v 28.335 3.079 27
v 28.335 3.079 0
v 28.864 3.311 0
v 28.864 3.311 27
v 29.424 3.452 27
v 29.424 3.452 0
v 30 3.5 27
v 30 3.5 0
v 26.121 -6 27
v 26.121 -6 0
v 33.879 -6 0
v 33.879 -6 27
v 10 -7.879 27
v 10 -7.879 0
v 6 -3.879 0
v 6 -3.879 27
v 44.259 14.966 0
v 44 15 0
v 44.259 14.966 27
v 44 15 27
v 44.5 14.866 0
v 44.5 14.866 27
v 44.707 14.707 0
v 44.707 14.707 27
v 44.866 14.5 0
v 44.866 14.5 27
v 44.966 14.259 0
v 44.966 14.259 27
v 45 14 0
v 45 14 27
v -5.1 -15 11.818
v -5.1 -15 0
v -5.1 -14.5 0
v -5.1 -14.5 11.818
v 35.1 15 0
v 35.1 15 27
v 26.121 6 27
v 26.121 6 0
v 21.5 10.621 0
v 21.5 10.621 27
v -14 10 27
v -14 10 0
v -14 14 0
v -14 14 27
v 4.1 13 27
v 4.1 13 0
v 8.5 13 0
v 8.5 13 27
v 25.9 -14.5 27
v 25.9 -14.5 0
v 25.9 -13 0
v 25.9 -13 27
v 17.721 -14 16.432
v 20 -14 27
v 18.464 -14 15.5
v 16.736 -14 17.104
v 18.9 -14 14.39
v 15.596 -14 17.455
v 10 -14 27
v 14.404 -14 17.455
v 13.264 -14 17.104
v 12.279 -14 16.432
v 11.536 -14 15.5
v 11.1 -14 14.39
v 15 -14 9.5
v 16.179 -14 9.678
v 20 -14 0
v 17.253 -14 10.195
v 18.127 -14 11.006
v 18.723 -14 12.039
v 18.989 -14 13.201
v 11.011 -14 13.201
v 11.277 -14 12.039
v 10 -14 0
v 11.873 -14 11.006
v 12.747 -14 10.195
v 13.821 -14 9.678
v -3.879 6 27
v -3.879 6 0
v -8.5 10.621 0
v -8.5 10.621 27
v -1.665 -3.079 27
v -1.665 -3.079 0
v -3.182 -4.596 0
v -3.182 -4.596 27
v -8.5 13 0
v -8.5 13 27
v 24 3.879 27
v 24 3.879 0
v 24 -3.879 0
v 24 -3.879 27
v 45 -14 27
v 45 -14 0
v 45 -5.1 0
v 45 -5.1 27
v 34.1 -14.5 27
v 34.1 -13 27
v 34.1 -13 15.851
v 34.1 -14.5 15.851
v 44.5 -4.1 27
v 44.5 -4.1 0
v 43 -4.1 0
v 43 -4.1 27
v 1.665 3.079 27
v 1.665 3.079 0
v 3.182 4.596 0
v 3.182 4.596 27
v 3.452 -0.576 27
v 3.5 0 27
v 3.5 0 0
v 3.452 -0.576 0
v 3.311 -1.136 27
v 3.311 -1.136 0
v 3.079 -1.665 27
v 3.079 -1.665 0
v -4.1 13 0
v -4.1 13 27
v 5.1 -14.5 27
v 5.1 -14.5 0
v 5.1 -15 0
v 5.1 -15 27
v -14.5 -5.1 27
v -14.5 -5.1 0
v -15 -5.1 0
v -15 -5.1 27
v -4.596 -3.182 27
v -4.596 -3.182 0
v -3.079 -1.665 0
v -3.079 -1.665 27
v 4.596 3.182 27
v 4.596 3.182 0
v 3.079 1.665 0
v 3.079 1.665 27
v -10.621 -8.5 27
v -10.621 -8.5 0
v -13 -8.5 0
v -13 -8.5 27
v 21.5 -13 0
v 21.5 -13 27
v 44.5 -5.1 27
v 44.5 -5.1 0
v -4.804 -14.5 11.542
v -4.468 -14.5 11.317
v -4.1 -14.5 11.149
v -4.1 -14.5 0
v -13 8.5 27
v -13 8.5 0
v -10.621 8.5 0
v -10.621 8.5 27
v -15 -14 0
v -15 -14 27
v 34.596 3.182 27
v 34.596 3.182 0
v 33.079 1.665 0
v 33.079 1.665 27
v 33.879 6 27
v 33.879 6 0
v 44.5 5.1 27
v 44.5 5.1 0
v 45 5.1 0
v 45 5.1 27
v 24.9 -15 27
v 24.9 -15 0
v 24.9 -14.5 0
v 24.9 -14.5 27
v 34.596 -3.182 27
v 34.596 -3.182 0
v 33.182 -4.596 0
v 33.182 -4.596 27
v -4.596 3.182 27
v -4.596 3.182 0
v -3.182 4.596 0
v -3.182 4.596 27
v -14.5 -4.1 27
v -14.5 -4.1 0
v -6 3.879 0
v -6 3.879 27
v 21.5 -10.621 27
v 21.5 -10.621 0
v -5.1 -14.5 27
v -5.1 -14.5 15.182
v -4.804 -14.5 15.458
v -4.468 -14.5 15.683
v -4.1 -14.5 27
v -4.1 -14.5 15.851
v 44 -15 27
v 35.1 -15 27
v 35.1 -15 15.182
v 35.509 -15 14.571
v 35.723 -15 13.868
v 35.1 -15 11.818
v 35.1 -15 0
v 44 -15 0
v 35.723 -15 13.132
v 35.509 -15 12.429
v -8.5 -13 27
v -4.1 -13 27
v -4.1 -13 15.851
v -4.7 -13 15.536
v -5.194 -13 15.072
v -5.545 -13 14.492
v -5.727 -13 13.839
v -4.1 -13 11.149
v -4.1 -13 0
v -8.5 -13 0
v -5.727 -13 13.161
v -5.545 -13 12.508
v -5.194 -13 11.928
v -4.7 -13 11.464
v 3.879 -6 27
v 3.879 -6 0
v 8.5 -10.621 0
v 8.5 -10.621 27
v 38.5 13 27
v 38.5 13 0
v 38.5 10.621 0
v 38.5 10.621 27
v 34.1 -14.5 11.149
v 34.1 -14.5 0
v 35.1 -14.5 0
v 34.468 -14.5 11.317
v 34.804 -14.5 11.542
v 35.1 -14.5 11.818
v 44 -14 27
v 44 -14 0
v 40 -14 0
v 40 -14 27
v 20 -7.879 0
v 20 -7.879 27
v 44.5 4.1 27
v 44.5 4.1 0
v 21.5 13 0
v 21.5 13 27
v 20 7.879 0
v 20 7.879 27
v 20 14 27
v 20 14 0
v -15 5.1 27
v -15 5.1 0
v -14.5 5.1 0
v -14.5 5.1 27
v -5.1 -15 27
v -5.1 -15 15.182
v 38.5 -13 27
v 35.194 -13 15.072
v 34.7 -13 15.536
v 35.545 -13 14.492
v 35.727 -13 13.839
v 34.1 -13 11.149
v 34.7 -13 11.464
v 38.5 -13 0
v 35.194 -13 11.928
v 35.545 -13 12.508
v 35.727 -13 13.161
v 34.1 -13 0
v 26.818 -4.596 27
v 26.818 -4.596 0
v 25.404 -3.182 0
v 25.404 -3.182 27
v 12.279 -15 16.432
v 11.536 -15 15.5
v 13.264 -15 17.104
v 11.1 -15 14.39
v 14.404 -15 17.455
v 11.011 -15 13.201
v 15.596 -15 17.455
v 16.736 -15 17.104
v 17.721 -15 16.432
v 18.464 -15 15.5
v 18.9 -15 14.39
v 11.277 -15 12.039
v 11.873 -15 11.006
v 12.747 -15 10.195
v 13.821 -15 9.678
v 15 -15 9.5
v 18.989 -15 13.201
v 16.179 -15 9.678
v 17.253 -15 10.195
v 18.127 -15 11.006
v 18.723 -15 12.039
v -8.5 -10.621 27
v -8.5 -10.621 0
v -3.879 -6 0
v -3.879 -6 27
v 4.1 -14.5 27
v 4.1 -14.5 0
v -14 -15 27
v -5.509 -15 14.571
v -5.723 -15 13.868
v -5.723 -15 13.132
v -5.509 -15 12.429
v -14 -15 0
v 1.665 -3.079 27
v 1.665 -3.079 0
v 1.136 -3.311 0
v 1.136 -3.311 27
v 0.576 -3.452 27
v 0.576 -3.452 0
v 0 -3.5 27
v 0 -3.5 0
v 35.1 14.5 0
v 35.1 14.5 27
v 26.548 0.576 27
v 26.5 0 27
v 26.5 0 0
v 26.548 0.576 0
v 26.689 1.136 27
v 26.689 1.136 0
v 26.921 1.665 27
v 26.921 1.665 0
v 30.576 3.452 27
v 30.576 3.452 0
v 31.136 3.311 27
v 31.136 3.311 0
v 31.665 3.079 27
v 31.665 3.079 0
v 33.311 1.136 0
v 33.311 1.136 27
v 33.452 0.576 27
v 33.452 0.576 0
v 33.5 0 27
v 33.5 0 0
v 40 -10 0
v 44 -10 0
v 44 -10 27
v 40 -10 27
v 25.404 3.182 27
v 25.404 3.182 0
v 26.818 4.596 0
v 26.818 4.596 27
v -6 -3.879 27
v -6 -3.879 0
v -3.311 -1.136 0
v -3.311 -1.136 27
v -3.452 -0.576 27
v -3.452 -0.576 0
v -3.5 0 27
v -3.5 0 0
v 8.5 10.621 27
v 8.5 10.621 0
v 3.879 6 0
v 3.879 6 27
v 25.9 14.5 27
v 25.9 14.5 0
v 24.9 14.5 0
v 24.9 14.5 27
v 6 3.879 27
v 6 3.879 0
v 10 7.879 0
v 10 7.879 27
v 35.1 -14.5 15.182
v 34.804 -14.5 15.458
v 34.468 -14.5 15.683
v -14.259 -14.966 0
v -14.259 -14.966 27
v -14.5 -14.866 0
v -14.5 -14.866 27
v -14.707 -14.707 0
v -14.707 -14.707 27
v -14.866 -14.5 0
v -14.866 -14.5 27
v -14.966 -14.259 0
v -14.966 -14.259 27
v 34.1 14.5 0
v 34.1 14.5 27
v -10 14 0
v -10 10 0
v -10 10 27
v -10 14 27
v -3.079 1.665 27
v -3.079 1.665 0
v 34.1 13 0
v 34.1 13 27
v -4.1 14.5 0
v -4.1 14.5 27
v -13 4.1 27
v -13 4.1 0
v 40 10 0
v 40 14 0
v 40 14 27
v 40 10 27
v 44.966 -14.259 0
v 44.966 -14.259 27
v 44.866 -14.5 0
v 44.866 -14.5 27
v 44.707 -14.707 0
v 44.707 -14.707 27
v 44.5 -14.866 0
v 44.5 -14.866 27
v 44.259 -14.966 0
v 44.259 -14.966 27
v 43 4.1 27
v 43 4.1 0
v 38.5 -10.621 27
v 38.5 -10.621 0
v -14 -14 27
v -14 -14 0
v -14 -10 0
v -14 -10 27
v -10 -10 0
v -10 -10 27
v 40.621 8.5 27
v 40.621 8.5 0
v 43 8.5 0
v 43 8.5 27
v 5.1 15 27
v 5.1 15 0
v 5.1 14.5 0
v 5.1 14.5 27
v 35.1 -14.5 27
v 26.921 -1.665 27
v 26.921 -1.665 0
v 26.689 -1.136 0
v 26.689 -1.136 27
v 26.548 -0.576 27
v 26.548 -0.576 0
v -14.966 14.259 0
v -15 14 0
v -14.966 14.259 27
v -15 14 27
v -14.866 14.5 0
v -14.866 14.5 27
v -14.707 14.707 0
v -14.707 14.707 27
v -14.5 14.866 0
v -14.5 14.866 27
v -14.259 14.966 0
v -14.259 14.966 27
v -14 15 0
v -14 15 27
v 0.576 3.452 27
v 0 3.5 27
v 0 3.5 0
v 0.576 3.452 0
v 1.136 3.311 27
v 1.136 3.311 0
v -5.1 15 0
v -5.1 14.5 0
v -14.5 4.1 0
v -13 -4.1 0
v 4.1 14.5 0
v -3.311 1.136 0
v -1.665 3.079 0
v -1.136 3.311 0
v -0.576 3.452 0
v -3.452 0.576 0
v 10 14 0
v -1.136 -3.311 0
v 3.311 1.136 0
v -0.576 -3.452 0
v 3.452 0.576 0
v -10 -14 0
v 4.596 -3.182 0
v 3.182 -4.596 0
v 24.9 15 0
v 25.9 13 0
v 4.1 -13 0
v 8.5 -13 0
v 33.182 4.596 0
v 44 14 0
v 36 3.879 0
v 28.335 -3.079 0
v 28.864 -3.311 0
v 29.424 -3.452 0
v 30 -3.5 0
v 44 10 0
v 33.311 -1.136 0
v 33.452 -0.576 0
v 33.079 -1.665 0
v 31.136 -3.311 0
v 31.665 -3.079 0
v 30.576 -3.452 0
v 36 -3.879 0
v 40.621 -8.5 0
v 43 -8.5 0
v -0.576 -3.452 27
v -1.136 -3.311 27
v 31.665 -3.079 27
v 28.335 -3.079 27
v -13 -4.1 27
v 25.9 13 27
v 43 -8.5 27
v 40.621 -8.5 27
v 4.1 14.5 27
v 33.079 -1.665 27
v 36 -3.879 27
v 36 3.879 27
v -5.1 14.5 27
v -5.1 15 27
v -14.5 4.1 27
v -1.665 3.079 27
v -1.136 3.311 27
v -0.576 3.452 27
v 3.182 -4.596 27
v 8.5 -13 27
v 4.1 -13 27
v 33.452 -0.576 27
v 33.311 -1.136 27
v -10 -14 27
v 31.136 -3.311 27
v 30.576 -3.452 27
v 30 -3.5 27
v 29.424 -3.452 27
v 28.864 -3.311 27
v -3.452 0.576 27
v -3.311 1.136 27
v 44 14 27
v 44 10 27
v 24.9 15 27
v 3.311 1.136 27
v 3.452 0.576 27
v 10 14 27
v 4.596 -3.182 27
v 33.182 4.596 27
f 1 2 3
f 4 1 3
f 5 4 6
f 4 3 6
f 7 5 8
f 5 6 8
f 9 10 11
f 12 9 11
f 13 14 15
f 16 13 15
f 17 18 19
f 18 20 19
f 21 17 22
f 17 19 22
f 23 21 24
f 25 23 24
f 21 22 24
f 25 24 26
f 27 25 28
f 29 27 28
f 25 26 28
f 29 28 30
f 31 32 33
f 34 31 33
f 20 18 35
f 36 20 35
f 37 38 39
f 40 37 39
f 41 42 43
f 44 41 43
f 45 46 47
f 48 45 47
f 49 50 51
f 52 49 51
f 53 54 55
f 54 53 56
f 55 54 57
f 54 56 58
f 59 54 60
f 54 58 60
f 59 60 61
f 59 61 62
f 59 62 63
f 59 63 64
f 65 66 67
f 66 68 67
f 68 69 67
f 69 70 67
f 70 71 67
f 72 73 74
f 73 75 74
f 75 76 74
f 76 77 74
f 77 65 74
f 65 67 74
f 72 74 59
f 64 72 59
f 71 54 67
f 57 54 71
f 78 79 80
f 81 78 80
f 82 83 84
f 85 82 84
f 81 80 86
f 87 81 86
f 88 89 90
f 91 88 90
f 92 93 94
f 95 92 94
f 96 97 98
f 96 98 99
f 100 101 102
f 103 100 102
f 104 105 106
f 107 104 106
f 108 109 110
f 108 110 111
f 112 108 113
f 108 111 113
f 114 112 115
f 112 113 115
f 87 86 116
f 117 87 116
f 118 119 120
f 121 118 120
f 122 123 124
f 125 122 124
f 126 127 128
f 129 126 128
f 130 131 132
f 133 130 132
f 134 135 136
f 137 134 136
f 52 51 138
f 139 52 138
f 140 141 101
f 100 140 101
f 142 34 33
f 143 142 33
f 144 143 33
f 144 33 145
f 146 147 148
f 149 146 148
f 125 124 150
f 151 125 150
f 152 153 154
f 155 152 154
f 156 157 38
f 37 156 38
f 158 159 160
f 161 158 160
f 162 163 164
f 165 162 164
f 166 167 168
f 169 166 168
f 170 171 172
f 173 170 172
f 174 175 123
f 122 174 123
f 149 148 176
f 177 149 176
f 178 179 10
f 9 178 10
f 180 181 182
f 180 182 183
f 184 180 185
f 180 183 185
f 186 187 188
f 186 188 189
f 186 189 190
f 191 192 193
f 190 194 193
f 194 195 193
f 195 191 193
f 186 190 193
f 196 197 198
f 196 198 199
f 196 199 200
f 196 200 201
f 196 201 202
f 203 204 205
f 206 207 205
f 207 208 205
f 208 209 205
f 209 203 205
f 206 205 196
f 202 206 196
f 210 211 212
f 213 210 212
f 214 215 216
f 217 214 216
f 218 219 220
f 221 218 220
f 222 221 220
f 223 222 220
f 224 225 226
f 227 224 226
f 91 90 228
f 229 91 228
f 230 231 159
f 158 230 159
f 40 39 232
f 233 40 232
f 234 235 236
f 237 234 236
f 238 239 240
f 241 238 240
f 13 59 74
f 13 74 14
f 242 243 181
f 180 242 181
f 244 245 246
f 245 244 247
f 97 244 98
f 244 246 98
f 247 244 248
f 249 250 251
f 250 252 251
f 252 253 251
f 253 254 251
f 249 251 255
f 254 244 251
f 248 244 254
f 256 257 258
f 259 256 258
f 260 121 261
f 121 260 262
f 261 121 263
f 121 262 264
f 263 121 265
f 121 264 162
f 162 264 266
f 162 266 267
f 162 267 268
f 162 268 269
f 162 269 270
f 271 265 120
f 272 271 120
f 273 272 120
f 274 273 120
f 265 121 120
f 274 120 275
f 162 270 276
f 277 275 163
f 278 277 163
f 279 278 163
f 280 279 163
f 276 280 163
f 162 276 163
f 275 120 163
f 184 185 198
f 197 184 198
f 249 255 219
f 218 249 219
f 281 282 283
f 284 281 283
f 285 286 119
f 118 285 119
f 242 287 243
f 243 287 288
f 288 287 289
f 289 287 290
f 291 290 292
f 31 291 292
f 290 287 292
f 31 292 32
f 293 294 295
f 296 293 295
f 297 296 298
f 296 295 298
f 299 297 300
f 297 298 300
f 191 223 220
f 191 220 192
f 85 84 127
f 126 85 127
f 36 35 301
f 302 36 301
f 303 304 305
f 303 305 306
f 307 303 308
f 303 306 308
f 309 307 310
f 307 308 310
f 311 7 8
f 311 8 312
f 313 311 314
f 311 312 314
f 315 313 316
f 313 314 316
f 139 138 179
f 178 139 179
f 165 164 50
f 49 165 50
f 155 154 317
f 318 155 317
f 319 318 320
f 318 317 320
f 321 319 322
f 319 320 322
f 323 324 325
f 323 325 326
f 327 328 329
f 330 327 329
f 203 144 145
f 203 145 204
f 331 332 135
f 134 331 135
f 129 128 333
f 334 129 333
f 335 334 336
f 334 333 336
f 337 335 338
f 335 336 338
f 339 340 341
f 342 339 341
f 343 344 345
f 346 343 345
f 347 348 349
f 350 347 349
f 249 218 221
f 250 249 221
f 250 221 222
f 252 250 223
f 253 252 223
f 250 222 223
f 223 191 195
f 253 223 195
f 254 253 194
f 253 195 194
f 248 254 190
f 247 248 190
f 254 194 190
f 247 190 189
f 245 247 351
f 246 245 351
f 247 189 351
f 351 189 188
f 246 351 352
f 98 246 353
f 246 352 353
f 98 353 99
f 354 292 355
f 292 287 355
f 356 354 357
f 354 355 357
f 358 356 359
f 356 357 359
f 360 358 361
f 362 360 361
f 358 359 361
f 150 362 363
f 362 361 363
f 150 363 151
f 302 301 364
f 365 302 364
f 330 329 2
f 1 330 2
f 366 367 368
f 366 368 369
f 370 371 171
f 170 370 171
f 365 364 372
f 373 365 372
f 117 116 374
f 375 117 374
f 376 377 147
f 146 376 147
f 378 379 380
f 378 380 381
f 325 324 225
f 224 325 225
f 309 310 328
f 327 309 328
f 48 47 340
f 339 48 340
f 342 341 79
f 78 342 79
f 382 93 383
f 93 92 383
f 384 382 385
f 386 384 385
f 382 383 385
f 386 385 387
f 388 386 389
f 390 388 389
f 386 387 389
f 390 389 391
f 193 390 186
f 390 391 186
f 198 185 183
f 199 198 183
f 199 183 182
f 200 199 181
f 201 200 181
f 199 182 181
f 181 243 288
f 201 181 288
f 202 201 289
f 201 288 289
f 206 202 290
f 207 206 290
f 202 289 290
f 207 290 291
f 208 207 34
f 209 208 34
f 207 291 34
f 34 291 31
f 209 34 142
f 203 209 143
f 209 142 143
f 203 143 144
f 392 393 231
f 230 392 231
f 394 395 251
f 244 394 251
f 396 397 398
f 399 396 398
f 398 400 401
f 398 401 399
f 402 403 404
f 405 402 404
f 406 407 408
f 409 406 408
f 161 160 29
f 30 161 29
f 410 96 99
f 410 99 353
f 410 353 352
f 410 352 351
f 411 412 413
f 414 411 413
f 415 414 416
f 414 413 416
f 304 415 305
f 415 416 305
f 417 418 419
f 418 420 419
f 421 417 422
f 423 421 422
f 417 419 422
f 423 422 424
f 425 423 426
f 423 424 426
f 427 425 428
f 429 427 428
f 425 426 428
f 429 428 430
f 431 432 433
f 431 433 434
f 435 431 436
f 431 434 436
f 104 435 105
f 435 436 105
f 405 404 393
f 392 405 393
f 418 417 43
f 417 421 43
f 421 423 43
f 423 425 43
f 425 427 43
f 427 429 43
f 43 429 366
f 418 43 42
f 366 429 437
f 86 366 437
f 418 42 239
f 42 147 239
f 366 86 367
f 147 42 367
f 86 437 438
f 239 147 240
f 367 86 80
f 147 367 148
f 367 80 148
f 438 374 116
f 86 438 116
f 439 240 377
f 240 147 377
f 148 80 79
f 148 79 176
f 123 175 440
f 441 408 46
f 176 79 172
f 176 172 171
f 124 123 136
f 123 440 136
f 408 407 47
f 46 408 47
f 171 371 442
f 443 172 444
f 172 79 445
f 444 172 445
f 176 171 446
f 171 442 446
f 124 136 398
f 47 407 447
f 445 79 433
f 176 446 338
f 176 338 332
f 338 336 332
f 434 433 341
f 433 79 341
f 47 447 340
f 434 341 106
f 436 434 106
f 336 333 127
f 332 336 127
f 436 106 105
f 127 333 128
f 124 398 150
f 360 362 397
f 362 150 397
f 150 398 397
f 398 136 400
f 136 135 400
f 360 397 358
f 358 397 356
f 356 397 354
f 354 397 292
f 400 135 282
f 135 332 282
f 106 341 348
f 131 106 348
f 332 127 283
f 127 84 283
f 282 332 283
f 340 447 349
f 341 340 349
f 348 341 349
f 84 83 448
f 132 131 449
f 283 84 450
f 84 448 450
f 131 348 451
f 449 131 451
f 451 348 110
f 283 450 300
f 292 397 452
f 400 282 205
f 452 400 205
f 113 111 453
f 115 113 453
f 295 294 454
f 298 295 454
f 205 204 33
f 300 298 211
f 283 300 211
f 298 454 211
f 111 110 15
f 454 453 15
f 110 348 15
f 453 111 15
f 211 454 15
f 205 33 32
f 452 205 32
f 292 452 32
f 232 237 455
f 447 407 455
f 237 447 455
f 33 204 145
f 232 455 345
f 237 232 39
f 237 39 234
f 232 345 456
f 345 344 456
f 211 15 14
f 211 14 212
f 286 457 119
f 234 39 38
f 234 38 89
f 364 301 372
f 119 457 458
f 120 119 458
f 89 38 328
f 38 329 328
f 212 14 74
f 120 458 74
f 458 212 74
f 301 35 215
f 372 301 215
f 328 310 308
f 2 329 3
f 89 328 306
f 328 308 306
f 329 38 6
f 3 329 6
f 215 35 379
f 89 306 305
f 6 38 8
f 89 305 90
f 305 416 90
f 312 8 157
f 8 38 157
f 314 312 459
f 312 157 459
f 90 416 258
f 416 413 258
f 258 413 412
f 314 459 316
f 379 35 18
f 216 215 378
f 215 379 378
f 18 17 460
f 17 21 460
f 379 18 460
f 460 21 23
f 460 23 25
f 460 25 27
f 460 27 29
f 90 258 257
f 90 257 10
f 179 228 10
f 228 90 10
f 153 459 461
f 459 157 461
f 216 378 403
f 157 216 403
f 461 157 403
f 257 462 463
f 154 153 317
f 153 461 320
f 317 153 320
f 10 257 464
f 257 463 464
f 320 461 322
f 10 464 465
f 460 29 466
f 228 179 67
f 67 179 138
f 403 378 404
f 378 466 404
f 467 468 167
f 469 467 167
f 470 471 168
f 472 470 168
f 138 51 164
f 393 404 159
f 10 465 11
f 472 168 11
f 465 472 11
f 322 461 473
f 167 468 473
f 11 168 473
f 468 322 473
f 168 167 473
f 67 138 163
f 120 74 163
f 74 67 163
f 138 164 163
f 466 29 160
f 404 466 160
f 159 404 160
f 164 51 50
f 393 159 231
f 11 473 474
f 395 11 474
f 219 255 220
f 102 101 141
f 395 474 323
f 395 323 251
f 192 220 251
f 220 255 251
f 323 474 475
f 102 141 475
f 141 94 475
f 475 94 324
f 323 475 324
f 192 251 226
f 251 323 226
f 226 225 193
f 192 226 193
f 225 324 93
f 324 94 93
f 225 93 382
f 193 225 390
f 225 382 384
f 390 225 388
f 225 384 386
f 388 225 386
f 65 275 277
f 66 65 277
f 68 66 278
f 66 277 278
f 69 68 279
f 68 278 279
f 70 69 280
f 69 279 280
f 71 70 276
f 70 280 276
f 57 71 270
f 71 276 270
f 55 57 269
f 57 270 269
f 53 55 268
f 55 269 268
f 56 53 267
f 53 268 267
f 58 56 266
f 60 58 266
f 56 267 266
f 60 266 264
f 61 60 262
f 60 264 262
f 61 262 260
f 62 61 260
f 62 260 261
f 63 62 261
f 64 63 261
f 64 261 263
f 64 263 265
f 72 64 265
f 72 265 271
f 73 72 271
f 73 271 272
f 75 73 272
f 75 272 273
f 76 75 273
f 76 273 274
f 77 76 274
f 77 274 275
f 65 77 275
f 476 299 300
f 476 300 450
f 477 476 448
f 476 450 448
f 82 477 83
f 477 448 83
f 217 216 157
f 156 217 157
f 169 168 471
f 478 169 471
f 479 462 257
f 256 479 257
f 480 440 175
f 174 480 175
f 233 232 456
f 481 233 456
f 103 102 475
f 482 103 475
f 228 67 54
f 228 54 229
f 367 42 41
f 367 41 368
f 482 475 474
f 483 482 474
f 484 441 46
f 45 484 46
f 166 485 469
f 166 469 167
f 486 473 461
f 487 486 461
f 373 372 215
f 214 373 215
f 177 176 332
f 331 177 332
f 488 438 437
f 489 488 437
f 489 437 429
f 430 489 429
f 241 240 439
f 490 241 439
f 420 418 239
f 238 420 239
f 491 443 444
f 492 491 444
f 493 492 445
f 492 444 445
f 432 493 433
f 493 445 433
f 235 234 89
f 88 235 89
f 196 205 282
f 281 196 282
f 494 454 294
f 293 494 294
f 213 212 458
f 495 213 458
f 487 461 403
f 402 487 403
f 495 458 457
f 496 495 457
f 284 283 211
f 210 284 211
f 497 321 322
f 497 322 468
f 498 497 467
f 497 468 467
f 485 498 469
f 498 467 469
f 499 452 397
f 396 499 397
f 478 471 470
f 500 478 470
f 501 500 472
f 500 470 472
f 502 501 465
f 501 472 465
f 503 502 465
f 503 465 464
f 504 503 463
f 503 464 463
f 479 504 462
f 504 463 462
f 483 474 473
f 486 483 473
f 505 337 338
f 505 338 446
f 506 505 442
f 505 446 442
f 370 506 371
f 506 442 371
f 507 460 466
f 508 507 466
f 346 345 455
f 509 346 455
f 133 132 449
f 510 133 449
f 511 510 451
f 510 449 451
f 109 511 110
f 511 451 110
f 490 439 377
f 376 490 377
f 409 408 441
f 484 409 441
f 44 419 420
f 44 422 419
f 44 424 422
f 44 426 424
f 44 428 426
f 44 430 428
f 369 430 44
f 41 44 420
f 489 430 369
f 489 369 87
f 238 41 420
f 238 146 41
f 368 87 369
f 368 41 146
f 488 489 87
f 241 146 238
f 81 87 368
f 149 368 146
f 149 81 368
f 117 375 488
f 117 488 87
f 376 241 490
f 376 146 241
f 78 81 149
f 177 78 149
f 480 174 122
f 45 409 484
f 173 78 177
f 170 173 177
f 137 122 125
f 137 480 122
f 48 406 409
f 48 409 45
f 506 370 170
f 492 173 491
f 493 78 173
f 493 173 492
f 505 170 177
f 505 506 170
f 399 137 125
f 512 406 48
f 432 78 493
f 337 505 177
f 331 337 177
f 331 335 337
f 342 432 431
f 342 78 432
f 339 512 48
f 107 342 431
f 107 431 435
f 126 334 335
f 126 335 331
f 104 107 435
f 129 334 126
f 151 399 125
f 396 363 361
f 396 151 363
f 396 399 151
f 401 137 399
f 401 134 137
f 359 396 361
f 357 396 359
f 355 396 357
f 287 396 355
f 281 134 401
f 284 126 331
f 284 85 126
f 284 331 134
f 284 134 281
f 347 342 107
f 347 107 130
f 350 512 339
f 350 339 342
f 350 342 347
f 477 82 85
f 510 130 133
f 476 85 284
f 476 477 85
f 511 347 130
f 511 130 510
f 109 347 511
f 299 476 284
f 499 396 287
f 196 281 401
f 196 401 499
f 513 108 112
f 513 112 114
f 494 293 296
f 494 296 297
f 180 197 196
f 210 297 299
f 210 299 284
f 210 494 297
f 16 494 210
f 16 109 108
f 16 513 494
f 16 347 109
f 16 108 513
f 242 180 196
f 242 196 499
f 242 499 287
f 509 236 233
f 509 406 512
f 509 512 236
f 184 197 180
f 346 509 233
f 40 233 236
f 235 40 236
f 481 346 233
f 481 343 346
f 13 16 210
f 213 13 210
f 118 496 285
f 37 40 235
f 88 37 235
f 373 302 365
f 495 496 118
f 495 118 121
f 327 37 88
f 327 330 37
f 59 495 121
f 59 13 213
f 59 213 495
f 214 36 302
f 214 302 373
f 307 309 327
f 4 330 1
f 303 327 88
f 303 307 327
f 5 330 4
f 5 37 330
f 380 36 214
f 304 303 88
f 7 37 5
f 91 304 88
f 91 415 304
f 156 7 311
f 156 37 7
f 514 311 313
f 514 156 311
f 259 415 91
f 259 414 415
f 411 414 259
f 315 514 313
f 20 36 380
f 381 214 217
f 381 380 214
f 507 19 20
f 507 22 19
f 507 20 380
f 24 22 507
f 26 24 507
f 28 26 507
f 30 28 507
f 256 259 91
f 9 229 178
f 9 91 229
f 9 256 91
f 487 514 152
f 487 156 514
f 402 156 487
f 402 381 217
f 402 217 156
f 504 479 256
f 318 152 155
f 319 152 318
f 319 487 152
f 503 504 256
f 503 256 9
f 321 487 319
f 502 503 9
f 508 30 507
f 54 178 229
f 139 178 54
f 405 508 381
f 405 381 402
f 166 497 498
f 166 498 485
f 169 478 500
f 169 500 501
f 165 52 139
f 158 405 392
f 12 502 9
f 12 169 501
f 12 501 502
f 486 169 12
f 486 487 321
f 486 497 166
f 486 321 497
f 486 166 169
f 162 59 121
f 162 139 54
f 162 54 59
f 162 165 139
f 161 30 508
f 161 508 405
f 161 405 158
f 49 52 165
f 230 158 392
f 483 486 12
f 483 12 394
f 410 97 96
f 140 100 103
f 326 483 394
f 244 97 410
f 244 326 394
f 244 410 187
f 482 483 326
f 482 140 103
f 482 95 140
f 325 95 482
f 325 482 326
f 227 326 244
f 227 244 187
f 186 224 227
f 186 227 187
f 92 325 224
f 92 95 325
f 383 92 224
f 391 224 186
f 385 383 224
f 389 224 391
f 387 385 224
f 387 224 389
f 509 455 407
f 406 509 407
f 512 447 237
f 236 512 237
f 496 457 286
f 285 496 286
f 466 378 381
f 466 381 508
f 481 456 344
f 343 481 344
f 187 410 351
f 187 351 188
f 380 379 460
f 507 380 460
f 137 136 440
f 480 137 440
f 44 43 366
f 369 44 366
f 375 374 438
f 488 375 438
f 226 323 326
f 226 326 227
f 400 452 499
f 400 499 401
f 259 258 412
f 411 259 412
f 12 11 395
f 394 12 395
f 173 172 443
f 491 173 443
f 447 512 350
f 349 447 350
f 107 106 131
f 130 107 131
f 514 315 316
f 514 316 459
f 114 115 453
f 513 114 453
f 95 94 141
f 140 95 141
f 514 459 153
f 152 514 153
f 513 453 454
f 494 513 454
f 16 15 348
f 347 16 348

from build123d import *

# Parameters (mm, degrees)
ESBO_O1_W                      = 4
ESBO_O1_H                      = 4
RESSALTO_EXTRUS_O1_DEPTH       = 27
PADR_OCIRCULAR1_COUNT          = 4
PADR_O_LINEAR1_COUNT           = 2
PADR_O_LINEAR1_PITCH           = 30
PADR_O_LINEAR1_COPY_1_SKETCH_W = 4
PADR_O_LINEAR1_COPY_1_SKETCH_H = 4
PADR_O_LINEAR1_COPY_1_DEPTH    = 27
PADR_O_LINEAR1_COPY_2_SKETCH_W = 4
PADR_O_LINEAR1_COPY_2_SKETCH_H = 4
PADR_O_LINEAR1_COPY_2_DEPTH    = 27
PADR_O_LINEAR1_COPY_3_SKETCH_W = 4
PADR_O_LINEAR1_COPY_3_SKETCH_H = 4
PADR_O_LINEAR1_COPY_3_DEPTH    = 27
ESBO_O4_W                      = 10
ESBO_O4_H                      = 28
CORTE_EXTRUS_O1_DEPTH          = 55.580216196
FILETE1_R                      = 1
SKETCH1_R                      = 2.5
SKETCH1_R_2                    = 4
CUT_EXTRUDE1_DEPTH             = 6


with BuildPart() as part:
    # Esboço1 → Ressalto-extrusão1 (new body)
    with BuildSketch(Plane.XY):
        with BuildLine():
            ThreePointArc((-1.664601464, 3.078815026), (-0.858529967, 3.393070335), (0, 3.5))
            Line((0, 3.5), (0, 6))
            Line((0, 6), (-3.878679656, 6))
            Line((-3.878679656, 6), (-8.5, 10.621320344))
            Line((-8.5, 10.621320344), (-8.5, 13))
            Line((-8.5, 13), (-4.1, 13))
            Line((-4.1, 13), (-4.1, 14.5))
            Line((-4.1, 14.5), (-5.1, 14.5))
            Line((-5.1, 14.5), (-5.1, 15))
            Line((-5.1, 15), (-15, 15))
            Line((-15, 15), (-15, 5.1))
            Line((-15, 5.1), (-14.5, 5.1))
            Line((-14.5, 5.1), (-14.5, 4.1))
            Line((-14.5, 4.1), (-13, 4.1))
            Line((-13, 4.1), (-13, 8.5))
            Line((-13, 8.5), (-10.621320344, 8.5))
            Line((-10.621320344, 8.5), (-6, 3.878679656))
            Line((-6, 3.878679656), (-6, 0))
            Line((-6, 0), (-3.5, 0))
            ThreePointArc((-3.5, 0), (-3.393070335, 0.858529967), (-3.078815026, 1.664601464))
            Line((-3.078815026, 1.664601464), (-4.596194078, 3.181980515))
            Line((-4.596194078, 3.181980515), (-3.181980515, 4.596194078))
            Line((-3.181980515, 4.596194078), (-1.664601464, 3.078815026))
        make_face()
        with Locations((-12, 12)):
            Rectangle(ESBO_O1_W, ESBO_O1_H, mode=Mode.SUBTRACT)
    ressalto_extrus_o1 = extrude(amount=RESSALTO_EXTRUS_O1_DEPTH)

    # PadrãoCircular1: Ressalto-extrusão1 ×4 about axis
    padr_ocircular1_axis = Axis((0, 0, 0), (0, 0, 1))
    for i in range(1, PADR_OCIRCULAR1_COUNT):
        add(ressalto_extrus_o1.rotate(padr_ocircular1_axis, i * 360 / PADR_OCIRCULAR1_COUNT))

    # Padrão linear1: Ressalto-extrusão1 ×2
    with Locations(*[(i * PADR_O_LINEAR1_PITCH, 0, 0) for i in range(1, PADR_O_LINEAR1_COUNT)]):
        add(ressalto_extrus_o1)

    # Padrão linear1 copy 1 sketch → Padrão linear1 copy 1 (add)
    with BuildSketch(Plane(origin=(30, 0, 0), x_dir=(0, 1, 0), z_dir=(0, 0, 1))):
        with BuildLine():
            ThreePointArc((-1.664601464, 3.078815026), (-0.858529967, 3.393070335), (0, 3.5))
            Line((0, 3.5), (0, 6))
            Line((0, 6), (-3.878679656, 6))
            Line((-3.878679656, 6), (-8.5, 10.621320344))
            Line((-8.5, 10.621320344), (-8.5, 13))
            Line((-8.5, 13), (-4.1, 13))
            Line((-4.1, 13), (-4.1, 14.5))
            Line((-4.1, 14.5), (-5.1, 14.5))
            Line((-5.1, 14.5), (-5.1, 15))
            Line((-5.1, 15), (-15, 15))
            Line((-15, 15), (-15, 5.1))
            Line((-15, 5.1), (-14.5, 5.1))
            Line((-14.5, 5.1), (-14.5, 4.1))
            Line((-14.5, 4.1), (-13, 4.1))
            Line((-13, 4.1), (-13, 8.5))
            Line((-13, 8.5), (-10.621320344, 8.5))
            Line((-10.621320344, 8.5), (-6, 3.878679656))
            Line((-6, 3.878679656), (-6, 0))
            Line((-6, 0), (-3.5, 0))
            ThreePointArc((-3.5, 0), (-3.393070335, 0.858529967), (-3.078815026, 1.664601464))
            Line((-3.078815026, 1.664601464), (-4.596194078, 3.181980515))
            Line((-4.596194078, 3.181980515), (-3.181980515, 4.596194078))
            Line((-3.181980515, 4.596194078), (-1.664601464, 3.078815026))
        make_face()
        with Locations((-12, 12)):
            Rectangle(PADR_O_LINEAR1_COPY_1_SKETCH_W, PADR_O_LINEAR1_COPY_1_SKETCH_H, mode=Mode.SUBTRACT)
    extrude(amount=PADR_O_LINEAR1_COPY_1_DEPTH)

    # Padrão linear1 copy 2 sketch → Padrão linear1 copy 2 (add)
    with BuildSketch(Plane(origin=(30, 0, 0), x_dir=(-1, 0, 0), z_dir=(0, 0, 1))):
        with BuildLine():
            ThreePointArc((-1.664601464, 3.078815026), (-0.858529967, 3.393070335), (0, 3.5))
            Line((0, 3.5), (0, 6))
            Line((0, 6), (-3.878679656, 6))
            Line((-3.878679656, 6), (-8.5, 10.621320344))
            Line((-8.5, 10.621320344), (-8.5, 13))
            Line((-8.5, 13), (-4.1, 13))
            Line((-4.1, 13), (-4.1, 14.5))
            Line((-4.1, 14.5), (-5.1, 14.5))
            Line((-5.1, 14.5), (-5.1, 15))
            Line((-5.1, 15), (-15, 15))
            Line((-15, 15), (-15, 5.1))
            Line((-15, 5.1), (-14.5, 5.1))
            Line((-14.5, 5.1), (-14.5, 4.1))
            Line((-14.5, 4.1), (-13, 4.1))
            Line((-13, 4.1), (-13, 8.5))
            Line((-13, 8.5), (-10.621320344, 8.5))
            Line((-10.621320344, 8.5), (-6, 3.878679656))
            Line((-6, 3.878679656), (-6, 0))
            Line((-6, 0), (-3.5, 0))
            ThreePointArc((-3.5, 0), (-3.393070335, 0.858529967), (-3.078815026, 1.664601464))
            Line((-3.078815026, 1.664601464), (-4.596194078, 3.181980515))
            Line((-4.596194078, 3.181980515), (-3.181980515, 4.596194078))
            Line((-3.181980515, 4.596194078), (-1.664601464, 3.078815026))
        make_face()
        with Locations((-12, 12)):
            Rectangle(PADR_O_LINEAR1_COPY_2_SKETCH_W, PADR_O_LINEAR1_COPY_2_SKETCH_H, mode=Mode.SUBTRACT)
    extrude(amount=PADR_O_LINEAR1_COPY_2_DEPTH)

    # Padrão linear1 copy 3 sketch → Padrão linear1 copy 3 (add)
    with BuildSketch(Plane(origin=(30, 0, 0), x_dir=(0, -1, 0), z_dir=(0, 0, 1))):
        with BuildLine():
            ThreePointArc((-1.664601464, 3.078815026), (-0.858529967, 3.393070335), (0, 3.5))
            Line((0, 3.5), (0, 6))
            Line((0, 6), (-3.878679656, 6))
            Line((-3.878679656, 6), (-8.5, 10.621320344))
            Line((-8.5, 10.621320344), (-8.5, 13))
            Line((-8.5, 13), (-4.1, 13))
            Line((-4.1, 13), (-4.1, 14.5))
            Line((-4.1, 14.5), (-5.1, 14.5))
            Line((-5.1, 14.5), (-5.1, 15))
            Line((-5.1, 15), (-15, 15))
            Line((-15, 15), (-15, 5.1))
            Line((-15, 5.1), (-14.5, 5.1))
            Line((-14.5, 5.1), (-14.5, 4.1))
            Line((-14.5, 4.1), (-13, 4.1))
            Line((-13, 4.1), (-13, 8.5))
            Line((-13, 8.5), (-10.621320344, 8.5))
            Line((-10.621320344, 8.5), (-6, 3.878679656))
            Line((-6, 3.878679656), (-6, 0))
            Line((-6, 0), (-3.5, 0))
            ThreePointArc((-3.5, 0), (-3.393070335, 0.858529967), (-3.078815026, 1.664601464))
            Line((-3.078815026, 1.664601464), (-4.596194078, 3.181980515))
            Line((-4.596194078, 3.181980515), (-3.181980515, 4.596194078))
            Line((-3.181980515, 4.596194078), (-1.664601464, 3.078815026))
        make_face()
        with Locations((-12, 12)):
            Rectangle(PADR_O_LINEAR1_COPY_3_SKETCH_W, PADR_O_LINEAR1_COPY_3_SKETCH_H, mode=Mode.SUBTRACT)
    extrude(amount=PADR_O_LINEAR1_COPY_3_DEPTH)

    # Esboço4 → Corte-extrusão1 (cut, through all)
    with BuildSketch(Plane(origin=(0, 0, 0), x_dir=(-1, 0, 0), z_dir=(0, 0, -1))):
        with Locations((-15, 0)):
            Rectangle(ESBO_O4_W, ESBO_O4_H)
    extrude(amount=-CORTE_EXTRUS_O1_DEPTH, mode=Mode.SUBTRACT)

    # Filete1
    filete1_edges = [part.edges().sort_by_distance(p)[0] for p in [
        (45, -15, 13.5),
        (45, 15, 13.5),
        (-15, 15, 13.5),
        (-15, -15, 13.5),
    ]]
    fillet(filete1_edges, radius=FILETE1_R)

    # Sketch1 → Cut-Extrude1 (cut)
    with BuildSketch(Plane.XZ.offset(15)):
        with Locations((33.25, 13.5)):
            Circle(SKETCH1_R)
        with Locations((-3.25, 13.5)):
            Circle(SKETCH1_R)
        with Locations(Location((15, 13.5, 0), (0, 0, 270))):
            Circle(SKETCH1_R_2)
    extrude(amount=-CUT_EXTRUDE1_DEPTH, mode=Mode.SUBTRACT)


solid = part.part
